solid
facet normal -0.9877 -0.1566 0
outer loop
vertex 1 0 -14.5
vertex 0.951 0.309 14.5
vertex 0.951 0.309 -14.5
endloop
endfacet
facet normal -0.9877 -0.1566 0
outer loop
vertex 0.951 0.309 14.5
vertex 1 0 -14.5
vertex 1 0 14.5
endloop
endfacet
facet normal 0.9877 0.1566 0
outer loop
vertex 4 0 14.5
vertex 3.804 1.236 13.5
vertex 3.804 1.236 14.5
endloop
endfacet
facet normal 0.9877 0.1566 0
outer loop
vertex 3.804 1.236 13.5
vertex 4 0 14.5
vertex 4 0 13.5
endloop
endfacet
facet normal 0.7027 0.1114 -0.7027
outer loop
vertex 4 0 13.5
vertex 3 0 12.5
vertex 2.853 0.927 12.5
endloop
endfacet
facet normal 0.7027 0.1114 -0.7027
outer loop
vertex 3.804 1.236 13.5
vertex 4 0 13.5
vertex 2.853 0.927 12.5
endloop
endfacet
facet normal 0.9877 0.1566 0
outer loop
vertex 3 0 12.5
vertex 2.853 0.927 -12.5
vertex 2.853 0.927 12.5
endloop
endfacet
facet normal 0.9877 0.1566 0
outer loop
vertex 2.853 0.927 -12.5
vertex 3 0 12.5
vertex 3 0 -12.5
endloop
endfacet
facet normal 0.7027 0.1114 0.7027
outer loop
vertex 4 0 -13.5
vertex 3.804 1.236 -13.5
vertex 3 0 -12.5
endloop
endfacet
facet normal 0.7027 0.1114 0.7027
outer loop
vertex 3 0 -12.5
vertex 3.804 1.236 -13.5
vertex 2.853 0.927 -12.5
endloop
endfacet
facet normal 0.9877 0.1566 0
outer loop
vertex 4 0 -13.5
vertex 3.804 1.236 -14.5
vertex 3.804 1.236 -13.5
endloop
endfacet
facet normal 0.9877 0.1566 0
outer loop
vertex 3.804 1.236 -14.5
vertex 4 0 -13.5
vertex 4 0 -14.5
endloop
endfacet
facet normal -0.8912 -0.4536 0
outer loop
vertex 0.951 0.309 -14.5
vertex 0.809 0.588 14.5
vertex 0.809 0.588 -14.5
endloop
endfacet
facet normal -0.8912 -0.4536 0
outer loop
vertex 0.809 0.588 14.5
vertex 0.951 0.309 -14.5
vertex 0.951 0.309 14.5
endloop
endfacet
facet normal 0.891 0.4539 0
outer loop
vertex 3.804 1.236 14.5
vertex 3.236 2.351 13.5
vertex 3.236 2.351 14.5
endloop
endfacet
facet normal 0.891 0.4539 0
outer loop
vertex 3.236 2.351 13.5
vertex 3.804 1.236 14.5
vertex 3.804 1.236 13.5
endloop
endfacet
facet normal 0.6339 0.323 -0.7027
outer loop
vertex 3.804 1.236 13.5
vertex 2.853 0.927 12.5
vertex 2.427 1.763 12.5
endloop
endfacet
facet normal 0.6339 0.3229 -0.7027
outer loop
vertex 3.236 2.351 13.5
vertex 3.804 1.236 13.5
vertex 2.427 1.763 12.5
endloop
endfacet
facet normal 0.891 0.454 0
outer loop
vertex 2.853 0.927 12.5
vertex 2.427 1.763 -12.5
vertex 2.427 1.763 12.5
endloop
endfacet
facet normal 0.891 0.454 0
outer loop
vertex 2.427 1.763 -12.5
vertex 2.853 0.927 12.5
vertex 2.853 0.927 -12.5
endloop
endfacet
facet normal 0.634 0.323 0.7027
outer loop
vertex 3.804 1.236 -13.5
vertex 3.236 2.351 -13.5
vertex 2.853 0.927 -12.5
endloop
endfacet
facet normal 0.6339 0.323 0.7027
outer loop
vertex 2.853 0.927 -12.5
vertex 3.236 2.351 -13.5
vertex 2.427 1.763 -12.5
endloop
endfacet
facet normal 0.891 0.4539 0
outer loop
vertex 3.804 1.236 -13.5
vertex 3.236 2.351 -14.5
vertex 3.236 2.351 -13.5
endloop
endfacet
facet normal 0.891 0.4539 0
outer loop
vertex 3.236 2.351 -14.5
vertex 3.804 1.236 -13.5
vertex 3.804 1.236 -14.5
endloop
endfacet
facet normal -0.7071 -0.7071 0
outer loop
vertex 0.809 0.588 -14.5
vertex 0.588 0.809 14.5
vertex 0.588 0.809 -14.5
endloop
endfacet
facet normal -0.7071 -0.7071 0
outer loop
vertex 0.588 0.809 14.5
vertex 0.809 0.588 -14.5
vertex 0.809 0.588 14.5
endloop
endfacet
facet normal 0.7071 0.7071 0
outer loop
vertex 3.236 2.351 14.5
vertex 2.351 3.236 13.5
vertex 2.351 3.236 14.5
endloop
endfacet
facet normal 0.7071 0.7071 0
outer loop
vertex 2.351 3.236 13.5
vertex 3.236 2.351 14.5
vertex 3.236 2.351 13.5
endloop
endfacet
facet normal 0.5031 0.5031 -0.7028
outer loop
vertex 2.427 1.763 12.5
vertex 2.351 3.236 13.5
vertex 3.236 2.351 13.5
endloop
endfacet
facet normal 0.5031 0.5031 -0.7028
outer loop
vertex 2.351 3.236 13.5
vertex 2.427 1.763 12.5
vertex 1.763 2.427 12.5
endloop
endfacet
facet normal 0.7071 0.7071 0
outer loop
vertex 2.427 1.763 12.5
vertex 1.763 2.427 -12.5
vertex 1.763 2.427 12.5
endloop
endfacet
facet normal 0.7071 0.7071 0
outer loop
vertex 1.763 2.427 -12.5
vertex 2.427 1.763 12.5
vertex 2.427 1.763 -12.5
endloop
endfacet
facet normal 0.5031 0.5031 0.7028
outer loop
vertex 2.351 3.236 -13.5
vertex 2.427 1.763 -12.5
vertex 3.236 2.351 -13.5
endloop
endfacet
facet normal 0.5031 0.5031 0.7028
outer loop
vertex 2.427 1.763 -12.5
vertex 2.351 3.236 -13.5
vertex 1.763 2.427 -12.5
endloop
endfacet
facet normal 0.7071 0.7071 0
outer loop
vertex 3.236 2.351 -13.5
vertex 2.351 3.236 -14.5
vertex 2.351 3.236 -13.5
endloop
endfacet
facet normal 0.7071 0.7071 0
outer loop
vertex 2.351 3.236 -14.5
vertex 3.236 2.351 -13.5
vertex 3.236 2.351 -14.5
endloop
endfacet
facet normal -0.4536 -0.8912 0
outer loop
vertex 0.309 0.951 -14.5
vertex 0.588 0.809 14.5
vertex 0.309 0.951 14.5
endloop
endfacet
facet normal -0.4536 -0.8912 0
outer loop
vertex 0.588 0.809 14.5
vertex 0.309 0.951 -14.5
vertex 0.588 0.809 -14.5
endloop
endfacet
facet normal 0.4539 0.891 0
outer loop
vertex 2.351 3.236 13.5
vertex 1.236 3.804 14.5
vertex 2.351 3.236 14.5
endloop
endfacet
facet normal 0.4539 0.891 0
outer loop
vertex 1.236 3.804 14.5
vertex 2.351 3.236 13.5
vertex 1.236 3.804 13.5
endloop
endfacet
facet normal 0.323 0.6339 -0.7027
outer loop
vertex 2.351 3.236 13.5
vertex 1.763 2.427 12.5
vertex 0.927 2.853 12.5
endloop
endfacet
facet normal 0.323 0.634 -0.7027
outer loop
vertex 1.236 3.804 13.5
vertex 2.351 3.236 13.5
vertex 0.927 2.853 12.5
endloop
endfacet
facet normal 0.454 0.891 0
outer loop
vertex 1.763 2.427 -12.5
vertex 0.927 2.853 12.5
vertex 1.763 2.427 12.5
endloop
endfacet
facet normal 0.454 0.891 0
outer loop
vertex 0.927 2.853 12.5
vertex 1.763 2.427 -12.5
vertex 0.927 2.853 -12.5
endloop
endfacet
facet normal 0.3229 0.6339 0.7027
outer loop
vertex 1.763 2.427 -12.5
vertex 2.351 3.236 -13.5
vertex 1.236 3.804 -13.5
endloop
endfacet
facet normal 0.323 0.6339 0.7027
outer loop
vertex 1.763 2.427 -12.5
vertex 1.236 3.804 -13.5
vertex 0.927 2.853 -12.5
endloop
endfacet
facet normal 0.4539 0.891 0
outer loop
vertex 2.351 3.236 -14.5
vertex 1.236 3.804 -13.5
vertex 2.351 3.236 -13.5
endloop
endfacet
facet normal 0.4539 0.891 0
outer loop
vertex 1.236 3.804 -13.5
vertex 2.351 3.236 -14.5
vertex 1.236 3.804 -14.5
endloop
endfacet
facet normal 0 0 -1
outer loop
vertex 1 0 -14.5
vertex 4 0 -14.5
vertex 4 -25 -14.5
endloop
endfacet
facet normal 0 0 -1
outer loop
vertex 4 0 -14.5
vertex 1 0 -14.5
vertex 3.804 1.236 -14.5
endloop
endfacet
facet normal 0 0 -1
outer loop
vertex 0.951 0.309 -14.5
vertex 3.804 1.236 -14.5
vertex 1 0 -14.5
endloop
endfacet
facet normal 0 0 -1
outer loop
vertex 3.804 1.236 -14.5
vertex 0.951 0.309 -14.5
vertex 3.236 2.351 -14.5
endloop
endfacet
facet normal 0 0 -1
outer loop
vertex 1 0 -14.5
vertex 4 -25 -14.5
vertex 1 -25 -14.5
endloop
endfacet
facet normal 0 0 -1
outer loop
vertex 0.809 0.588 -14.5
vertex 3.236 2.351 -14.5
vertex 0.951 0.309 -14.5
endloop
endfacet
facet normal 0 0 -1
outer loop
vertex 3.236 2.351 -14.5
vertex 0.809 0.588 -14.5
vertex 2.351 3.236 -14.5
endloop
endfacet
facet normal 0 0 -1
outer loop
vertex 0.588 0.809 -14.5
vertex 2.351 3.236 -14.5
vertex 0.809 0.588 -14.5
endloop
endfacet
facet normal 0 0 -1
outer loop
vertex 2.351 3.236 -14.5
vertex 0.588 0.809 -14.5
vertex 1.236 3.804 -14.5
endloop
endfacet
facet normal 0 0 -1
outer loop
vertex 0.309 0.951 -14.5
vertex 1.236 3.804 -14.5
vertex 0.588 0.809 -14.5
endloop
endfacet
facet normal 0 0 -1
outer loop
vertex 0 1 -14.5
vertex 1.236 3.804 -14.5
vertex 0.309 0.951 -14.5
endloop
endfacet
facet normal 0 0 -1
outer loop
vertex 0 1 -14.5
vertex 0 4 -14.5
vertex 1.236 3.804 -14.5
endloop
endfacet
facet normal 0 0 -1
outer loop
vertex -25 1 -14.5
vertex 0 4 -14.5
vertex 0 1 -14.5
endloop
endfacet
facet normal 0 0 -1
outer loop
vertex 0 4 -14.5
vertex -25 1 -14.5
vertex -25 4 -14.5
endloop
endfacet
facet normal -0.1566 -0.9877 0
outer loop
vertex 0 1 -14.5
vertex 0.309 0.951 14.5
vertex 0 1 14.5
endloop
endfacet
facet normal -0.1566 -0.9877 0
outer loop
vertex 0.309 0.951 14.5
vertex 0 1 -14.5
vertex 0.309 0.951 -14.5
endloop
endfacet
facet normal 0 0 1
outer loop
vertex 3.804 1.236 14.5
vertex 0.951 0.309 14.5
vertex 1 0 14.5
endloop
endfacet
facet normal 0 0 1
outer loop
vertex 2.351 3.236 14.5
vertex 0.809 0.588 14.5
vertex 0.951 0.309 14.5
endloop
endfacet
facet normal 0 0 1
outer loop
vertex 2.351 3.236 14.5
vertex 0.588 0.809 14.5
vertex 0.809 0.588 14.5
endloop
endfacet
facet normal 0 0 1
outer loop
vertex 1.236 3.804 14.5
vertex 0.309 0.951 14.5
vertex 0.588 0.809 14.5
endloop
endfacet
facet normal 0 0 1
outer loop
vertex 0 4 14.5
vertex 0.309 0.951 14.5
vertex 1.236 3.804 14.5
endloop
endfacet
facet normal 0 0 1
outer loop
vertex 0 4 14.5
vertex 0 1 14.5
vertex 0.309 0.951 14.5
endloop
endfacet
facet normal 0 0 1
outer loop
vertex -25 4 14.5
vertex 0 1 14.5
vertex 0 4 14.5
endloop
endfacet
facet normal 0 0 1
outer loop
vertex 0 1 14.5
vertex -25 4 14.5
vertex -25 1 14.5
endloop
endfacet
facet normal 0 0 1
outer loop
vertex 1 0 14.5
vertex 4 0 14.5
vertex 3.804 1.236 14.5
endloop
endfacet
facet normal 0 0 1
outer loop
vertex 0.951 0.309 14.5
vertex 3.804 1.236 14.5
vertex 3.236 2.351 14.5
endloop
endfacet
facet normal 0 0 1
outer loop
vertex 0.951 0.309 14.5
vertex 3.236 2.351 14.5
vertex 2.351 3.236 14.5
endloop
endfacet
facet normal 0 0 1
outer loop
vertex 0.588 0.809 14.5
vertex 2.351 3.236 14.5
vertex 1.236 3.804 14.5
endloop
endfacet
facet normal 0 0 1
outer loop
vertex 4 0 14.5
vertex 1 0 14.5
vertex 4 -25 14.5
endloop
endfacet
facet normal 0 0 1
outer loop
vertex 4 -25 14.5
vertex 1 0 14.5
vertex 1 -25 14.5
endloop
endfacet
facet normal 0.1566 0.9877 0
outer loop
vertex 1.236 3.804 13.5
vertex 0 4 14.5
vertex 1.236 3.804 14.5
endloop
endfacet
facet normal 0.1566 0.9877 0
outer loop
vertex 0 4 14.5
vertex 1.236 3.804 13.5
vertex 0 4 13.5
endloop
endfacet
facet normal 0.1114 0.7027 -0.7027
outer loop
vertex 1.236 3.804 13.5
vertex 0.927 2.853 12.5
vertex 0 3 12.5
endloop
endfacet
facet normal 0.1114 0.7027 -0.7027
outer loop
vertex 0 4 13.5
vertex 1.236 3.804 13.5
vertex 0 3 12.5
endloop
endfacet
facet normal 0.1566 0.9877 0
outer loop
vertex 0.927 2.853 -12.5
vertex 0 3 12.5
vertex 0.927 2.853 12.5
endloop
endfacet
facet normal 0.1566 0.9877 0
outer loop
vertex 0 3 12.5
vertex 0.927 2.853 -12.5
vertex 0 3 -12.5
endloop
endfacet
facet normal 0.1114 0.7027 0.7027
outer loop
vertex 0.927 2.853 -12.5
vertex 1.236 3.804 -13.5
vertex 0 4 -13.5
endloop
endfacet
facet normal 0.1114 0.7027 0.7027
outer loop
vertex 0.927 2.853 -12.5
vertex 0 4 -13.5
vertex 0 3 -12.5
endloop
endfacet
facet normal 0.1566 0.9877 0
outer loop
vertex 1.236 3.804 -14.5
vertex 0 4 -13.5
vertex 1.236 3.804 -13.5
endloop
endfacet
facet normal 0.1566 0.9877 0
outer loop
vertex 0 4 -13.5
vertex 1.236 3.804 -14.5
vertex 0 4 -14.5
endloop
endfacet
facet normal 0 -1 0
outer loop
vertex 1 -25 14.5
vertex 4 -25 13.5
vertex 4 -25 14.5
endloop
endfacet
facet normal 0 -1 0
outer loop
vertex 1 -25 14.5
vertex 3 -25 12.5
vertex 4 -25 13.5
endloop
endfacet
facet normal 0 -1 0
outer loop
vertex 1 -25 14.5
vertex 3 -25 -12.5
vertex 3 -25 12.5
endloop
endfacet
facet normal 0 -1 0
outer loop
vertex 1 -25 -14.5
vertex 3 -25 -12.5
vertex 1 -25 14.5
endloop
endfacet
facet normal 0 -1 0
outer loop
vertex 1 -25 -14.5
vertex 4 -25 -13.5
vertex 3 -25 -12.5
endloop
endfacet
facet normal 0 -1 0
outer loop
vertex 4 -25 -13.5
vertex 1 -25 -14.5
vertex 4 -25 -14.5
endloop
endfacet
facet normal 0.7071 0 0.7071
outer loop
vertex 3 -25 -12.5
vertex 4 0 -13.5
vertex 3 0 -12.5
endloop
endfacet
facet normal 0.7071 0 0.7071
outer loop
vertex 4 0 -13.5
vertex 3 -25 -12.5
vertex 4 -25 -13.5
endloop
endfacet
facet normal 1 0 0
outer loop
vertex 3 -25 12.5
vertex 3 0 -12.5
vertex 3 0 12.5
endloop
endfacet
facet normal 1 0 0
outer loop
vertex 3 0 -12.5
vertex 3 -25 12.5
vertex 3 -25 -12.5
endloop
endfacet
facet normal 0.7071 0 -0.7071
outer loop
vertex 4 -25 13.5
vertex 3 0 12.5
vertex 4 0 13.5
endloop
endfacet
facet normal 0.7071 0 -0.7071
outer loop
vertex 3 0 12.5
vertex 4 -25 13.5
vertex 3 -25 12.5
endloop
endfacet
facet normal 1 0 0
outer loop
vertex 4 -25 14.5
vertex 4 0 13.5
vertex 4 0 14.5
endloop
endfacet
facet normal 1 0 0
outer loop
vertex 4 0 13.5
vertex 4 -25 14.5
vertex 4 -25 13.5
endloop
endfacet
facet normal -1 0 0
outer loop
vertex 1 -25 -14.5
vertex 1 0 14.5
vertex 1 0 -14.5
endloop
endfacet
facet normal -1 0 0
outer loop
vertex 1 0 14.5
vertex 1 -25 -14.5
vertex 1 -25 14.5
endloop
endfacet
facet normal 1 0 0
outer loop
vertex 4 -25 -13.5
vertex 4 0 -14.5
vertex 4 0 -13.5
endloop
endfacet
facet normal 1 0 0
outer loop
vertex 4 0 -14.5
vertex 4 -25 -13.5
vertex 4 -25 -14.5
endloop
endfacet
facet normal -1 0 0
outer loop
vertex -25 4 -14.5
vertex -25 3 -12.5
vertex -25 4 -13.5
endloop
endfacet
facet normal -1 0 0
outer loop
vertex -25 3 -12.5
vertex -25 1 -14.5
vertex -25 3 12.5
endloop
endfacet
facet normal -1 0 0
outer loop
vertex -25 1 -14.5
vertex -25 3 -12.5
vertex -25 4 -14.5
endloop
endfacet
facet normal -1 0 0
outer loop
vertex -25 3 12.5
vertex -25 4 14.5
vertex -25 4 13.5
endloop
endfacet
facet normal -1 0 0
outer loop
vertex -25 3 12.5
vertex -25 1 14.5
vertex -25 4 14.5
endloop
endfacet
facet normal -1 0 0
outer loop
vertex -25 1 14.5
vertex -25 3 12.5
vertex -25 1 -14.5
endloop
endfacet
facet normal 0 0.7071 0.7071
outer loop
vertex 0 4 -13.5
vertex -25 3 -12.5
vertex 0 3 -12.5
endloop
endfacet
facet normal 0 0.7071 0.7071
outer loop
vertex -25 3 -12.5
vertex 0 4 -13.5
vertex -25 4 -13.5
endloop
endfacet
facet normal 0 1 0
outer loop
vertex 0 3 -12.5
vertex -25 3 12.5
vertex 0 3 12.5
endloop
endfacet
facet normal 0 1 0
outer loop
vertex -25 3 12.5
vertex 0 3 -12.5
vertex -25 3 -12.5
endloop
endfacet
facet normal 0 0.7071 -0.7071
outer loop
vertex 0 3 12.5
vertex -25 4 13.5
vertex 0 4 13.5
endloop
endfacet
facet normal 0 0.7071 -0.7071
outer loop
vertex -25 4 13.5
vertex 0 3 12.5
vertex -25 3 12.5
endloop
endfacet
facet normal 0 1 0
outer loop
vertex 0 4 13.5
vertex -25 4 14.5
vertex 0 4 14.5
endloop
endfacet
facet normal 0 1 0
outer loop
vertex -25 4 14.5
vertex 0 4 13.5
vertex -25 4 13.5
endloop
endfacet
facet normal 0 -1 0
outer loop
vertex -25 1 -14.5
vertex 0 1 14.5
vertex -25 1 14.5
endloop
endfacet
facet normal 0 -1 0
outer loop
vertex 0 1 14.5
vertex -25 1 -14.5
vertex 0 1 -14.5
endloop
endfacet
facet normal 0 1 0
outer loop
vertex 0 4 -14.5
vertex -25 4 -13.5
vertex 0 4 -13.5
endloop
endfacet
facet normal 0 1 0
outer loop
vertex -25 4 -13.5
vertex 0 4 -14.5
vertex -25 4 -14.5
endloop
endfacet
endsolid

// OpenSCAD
strip_width = 25;
min_wall = 2;
edge_radius = 1;

rotate_extrude(angle = 90, $fn=20) shape();
rotate([90, 0, 0]) 
    linear_extrude(strip_width) shape();   
translate ([-strip_width, 0, 0]) 
    rotate([90, 0, 90]) 
        linear_extrude(strip_width) shape();    

module shape() 
    polygon( points=[
    [edge_radius, -strip_width/2 - 2],
    [edge_radius + min_wall + 1, -strip_width/2 - 2], 
    [edge_radius + min_wall + 1, -strip_width/2 - 1],
    [edge_radius + min_wall, -strip_width/2], 
    [edge_radius + min_wall, strip_width/2], 
    [edge_radius + min_wall + 1, strip_width/2 + 1], 
    [edge_radius + min_wall + 1, strip_width/2 + 2], 
    [edge_radius, strip_width/2 + 2],] );
